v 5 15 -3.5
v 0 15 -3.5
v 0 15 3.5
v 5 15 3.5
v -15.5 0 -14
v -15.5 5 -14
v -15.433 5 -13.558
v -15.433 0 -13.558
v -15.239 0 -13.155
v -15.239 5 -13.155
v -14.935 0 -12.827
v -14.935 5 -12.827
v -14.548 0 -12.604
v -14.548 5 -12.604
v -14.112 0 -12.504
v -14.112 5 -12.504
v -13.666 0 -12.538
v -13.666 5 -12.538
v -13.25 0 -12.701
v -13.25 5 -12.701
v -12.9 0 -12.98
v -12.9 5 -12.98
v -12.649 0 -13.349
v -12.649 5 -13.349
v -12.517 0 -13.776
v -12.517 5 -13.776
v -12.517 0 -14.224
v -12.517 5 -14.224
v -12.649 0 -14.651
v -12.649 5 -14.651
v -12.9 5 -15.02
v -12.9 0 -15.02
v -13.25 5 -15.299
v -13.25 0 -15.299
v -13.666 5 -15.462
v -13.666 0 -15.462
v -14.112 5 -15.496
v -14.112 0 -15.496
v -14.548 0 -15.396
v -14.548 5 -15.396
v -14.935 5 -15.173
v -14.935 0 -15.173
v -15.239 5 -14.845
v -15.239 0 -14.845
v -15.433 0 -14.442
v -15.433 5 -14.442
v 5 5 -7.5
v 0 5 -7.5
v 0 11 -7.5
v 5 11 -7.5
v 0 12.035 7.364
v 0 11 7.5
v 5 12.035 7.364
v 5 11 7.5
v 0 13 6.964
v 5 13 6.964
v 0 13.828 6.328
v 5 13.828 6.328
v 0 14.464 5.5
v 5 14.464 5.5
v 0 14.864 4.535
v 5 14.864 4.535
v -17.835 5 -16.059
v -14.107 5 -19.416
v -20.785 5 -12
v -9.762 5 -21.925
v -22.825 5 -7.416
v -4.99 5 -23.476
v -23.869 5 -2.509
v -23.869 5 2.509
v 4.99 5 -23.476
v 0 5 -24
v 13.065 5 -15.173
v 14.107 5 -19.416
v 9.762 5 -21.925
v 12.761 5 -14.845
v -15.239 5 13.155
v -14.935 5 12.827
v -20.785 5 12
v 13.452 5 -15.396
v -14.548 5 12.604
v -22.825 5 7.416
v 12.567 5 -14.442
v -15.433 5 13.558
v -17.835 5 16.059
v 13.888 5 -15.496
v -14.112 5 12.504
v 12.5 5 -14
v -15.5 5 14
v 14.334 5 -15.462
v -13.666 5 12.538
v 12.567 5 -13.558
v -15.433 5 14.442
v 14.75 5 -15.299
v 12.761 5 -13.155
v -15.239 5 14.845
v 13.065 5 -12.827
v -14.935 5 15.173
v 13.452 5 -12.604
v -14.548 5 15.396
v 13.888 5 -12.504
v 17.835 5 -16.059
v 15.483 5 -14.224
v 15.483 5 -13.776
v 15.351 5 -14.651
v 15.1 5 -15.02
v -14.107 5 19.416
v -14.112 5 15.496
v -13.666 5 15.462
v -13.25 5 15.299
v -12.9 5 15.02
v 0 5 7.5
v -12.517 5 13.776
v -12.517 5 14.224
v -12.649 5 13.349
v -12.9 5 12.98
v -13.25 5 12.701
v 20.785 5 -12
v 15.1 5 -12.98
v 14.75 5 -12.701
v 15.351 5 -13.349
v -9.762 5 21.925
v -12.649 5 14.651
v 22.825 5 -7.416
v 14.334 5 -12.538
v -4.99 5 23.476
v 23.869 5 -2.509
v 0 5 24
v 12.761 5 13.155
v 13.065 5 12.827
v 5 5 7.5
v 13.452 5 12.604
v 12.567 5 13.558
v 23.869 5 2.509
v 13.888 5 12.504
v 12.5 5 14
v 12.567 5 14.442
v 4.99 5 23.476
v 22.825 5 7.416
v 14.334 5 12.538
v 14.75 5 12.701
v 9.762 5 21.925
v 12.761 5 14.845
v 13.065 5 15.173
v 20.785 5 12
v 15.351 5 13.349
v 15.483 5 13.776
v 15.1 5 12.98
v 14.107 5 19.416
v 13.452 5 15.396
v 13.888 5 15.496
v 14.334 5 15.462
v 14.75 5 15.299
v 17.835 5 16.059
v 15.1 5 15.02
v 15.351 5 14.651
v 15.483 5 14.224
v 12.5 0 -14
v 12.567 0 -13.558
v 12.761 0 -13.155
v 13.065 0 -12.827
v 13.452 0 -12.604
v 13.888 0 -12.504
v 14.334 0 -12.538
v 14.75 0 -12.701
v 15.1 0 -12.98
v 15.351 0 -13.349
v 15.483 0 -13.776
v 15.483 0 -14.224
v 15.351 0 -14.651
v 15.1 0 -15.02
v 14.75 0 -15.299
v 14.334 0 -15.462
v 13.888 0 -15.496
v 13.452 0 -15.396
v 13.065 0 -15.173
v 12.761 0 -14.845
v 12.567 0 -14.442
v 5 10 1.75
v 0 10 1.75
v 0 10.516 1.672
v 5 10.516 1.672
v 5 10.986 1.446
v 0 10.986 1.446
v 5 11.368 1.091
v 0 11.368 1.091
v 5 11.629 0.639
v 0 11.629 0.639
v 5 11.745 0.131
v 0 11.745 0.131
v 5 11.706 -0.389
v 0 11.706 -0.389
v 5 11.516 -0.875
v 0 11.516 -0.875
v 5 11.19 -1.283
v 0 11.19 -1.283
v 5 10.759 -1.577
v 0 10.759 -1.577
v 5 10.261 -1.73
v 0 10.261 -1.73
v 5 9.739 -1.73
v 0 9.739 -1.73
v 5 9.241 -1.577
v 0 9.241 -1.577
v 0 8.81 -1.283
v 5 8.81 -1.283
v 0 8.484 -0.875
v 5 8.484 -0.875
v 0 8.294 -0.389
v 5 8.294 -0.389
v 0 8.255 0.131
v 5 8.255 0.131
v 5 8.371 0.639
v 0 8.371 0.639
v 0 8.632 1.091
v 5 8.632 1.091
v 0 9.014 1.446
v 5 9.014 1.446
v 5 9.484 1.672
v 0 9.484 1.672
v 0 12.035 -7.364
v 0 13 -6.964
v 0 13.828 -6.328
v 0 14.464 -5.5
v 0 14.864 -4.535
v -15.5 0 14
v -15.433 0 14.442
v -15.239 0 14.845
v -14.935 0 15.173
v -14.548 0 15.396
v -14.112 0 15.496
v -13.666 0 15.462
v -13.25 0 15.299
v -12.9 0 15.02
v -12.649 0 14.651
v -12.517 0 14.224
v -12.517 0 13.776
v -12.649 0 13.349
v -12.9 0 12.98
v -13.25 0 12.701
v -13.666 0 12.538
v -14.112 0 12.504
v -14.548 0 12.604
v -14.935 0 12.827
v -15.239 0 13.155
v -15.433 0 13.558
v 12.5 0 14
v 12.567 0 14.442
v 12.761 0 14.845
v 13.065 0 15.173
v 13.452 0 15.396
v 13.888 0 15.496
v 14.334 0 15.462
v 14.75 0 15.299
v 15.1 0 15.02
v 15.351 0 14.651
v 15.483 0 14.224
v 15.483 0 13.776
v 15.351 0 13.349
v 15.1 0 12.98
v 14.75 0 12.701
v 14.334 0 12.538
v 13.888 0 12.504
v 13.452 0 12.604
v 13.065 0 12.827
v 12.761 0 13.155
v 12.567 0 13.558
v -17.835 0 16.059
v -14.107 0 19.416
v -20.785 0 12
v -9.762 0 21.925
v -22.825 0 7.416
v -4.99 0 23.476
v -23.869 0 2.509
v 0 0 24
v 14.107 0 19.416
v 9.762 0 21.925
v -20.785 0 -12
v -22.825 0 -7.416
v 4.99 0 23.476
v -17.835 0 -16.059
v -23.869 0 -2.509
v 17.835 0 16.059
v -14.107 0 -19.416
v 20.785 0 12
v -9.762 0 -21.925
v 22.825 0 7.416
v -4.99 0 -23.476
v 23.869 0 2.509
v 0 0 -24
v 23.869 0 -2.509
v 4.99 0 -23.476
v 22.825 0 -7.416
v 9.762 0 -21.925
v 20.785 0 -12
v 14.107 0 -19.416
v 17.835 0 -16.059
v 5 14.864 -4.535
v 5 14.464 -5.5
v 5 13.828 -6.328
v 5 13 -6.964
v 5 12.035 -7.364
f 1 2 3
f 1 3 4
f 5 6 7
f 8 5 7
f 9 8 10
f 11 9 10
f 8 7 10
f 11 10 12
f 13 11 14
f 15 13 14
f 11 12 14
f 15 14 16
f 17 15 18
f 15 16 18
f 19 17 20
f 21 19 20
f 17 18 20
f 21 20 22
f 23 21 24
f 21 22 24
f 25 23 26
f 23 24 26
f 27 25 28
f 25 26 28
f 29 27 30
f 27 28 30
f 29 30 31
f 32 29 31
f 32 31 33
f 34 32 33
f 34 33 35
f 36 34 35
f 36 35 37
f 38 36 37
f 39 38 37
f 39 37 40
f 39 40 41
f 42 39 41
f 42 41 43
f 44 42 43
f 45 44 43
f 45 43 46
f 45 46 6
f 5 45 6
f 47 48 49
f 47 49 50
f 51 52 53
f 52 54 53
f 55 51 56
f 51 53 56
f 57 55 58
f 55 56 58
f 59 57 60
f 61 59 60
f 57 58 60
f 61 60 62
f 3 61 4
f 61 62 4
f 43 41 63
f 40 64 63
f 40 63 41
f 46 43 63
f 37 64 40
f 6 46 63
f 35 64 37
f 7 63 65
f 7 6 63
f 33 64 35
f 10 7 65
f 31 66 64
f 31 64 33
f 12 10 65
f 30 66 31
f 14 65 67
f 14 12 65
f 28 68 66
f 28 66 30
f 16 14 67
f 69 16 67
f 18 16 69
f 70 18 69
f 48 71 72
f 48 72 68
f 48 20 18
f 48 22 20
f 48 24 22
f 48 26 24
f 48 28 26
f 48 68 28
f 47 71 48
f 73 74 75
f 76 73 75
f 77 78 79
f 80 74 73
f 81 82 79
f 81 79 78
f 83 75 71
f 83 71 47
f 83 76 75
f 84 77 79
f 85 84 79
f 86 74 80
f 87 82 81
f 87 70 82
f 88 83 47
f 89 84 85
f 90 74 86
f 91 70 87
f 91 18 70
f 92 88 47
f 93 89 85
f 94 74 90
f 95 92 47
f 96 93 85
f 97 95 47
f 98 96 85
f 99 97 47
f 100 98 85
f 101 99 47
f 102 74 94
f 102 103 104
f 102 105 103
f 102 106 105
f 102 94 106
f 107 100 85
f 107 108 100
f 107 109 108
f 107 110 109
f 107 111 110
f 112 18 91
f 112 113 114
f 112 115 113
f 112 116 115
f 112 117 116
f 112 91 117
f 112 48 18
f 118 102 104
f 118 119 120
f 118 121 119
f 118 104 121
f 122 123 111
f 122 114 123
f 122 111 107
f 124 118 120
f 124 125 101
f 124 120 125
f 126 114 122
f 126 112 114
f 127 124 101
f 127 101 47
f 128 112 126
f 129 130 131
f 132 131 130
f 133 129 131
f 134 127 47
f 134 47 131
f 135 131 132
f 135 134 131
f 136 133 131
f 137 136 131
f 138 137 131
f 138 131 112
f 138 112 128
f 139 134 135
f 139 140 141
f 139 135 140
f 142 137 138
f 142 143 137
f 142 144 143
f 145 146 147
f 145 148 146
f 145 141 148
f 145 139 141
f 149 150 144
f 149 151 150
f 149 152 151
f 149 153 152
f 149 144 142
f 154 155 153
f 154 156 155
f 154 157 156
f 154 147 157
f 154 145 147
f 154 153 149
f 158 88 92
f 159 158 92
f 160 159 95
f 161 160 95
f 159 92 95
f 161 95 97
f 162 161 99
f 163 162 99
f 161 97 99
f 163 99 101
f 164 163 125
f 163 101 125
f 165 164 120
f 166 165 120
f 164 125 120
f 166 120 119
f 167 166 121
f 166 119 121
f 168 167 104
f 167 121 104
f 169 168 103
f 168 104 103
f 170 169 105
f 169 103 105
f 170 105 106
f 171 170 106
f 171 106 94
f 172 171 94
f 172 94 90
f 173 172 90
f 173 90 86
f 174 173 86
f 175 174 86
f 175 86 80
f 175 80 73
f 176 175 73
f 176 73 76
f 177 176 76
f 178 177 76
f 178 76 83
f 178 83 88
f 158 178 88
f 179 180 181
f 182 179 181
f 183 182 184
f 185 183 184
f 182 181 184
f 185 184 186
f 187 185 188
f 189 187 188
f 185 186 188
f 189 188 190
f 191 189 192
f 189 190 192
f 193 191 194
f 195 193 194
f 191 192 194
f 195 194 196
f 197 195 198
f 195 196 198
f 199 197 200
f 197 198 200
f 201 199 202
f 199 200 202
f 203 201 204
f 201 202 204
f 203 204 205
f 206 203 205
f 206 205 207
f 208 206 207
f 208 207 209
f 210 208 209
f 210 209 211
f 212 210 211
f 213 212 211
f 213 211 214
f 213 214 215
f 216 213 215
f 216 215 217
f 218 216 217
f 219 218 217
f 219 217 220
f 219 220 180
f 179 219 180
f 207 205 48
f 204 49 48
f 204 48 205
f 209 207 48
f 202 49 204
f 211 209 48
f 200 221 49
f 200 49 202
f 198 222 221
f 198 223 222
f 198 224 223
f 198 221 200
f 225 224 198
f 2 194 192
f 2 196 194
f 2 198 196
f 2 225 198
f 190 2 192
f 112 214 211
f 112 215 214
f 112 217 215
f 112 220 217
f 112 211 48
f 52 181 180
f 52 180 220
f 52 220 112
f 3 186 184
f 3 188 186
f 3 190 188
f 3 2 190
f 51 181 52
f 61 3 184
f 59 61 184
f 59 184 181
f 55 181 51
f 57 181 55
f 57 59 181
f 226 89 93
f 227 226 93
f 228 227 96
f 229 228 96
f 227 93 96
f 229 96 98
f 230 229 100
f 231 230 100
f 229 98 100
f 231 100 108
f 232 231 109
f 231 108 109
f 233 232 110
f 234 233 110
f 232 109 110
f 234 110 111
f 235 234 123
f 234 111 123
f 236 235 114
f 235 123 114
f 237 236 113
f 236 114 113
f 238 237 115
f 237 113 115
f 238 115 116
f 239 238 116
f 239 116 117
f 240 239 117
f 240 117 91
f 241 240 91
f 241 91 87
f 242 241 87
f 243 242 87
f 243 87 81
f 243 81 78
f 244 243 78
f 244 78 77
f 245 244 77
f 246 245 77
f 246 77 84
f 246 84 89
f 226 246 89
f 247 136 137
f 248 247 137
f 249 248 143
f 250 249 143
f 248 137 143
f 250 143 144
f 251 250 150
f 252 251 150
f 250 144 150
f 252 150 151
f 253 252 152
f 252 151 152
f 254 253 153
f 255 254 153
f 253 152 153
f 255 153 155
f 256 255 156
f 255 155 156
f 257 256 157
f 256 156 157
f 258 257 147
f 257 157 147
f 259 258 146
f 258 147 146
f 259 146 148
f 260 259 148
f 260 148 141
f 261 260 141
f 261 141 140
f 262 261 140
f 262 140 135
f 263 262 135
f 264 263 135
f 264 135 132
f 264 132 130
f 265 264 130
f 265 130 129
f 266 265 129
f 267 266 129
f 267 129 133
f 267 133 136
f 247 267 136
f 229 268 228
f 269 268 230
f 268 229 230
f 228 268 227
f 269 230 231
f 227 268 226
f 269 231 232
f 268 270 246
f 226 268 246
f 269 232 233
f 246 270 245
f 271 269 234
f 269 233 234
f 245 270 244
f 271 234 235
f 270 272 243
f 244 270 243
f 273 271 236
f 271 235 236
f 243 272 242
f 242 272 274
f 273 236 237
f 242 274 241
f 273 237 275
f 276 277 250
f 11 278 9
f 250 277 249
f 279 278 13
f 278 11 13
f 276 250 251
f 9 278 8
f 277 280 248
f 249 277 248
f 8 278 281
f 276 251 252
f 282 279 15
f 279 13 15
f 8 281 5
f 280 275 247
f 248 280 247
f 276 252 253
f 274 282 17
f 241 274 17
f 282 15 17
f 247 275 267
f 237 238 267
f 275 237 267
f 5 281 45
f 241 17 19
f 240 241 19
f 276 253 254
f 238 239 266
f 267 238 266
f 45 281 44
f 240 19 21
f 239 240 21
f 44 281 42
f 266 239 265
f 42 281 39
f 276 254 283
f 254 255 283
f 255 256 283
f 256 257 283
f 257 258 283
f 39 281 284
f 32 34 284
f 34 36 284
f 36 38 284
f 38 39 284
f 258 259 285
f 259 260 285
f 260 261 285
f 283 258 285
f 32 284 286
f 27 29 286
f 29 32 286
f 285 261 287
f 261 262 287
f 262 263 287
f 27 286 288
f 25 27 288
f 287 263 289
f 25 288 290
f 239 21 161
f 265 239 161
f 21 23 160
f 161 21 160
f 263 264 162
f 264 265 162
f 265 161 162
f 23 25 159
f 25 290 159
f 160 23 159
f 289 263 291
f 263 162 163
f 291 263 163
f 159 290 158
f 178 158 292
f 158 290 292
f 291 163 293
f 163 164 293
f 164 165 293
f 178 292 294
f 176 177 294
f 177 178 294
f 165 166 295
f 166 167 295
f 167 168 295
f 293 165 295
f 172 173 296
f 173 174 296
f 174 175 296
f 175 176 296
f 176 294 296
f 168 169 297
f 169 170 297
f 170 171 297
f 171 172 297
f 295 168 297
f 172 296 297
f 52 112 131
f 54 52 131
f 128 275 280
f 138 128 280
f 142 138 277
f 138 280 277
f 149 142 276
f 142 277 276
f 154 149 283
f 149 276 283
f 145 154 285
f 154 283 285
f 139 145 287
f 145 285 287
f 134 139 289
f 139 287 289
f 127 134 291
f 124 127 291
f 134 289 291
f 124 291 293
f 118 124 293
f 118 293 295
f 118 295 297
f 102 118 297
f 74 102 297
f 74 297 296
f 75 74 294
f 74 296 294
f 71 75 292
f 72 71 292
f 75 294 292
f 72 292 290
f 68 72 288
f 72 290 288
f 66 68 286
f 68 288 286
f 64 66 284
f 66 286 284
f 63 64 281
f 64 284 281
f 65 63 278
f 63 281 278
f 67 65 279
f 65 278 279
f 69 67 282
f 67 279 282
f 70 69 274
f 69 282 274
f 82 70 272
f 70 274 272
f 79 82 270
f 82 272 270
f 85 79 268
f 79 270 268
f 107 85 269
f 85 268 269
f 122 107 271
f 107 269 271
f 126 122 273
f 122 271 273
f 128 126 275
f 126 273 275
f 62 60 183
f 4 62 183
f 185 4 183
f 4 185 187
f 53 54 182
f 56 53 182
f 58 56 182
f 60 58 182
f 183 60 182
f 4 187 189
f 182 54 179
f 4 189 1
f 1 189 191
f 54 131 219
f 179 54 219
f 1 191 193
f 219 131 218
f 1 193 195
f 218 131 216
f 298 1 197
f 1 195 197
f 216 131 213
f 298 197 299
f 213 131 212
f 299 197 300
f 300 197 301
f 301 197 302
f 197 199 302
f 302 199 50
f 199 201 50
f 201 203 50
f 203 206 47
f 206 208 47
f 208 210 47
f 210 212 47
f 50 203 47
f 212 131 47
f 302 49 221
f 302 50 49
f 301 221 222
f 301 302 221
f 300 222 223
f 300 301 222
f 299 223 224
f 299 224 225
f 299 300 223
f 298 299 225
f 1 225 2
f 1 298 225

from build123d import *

# Parameters (mm, degrees)
SKETCH_1_R          = 24
EXTRUDE_1_DEPTH     = 5
SKETCH_2_W          = 10
SKETCH_2_H          = 15
EXTRUDE_2_DEPTH     = 15
CUT_EXTRUDE_1_REACH = 42.522
SKETCH_3_R          = 1.75
SKETCH_4_W          = 20
SKETCH_4_H          = 10
CUT_EXTRUDE_2_DEPTH = 5
F_3_0MM_1_D         = 3
FILLET_1_R          = 4


with BuildPart() as part:
    # 草图1 → 凸台-拉伸1 (new body)
    with BuildSketch(Plane(origin=(0, 0, 0), x_dir=(1, 0, 0), z_dir=(0, 1, 0))):
        with Locations(Location((0, 0, 0), (0, 0, 270))):
            Circle(SKETCH_1_R)
    extrude(amount=EXTRUDE_1_DEPTH)

    # 草图2 → 凸台-拉伸2 (add)
    with BuildSketch(Plane(origin=(0, 0, 0), x_dir=(1, 0, 0), z_dir=(0, 1, 0))):
        Rectangle(SKETCH_2_W, SKETCH_2_H)
    extrude(amount=EXTRUDE_2_DEPTH)

    # 草图3 → 切除-拉伸1 (cut, up to next)
    with BuildSketch(Plane.ZY.offset(5), mode=Mode.PRIVATE) as cut_extrude_1_sk1:
        with Locations((0, 10)):
            Circle(SKETCH_3_R)
    cut_extrude_1_tool1 = extrude(cut_extrude_1_sk1.sketch, amount=-CUT_EXTRUDE_1_REACH, mode=Mode.PRIVATE) & part.part
    add(cut_extrude_1_tool1.solids().sort_by_distance((-5, 10, 0))[0], mode=Mode.SUBTRACT)

    # 草图4 → 切除-拉伸2 (cut)
    with BuildSketch(Plane.ZY.offset(5)):
        with Locations((0, 10)):
            Rectangle(SKETCH_4_W, SKETCH_4_H)
    extrude(amount=-CUT_EXTRUDE_2_DEPTH, mode=Mode.SUBTRACT)

    # Ø3.0mm 暗销孔1 (through all)
    with Locations(Plane.XZ):
        with Locations((14, 14), (14, -14), (-14, 14), (-14, -14)):
            Hole(F_3_0MM_1_D / 2)

    # 圆角1
    fillet_1_edges = [part.edges().sort_by_distance(p)[0] for p in [
        (2.5, 15, -7.5),
        (2.5, 15, 7.5),
    ]]
    fillet(fillet_1_edges, radius=FILLET_1_R)


solid = part.part
